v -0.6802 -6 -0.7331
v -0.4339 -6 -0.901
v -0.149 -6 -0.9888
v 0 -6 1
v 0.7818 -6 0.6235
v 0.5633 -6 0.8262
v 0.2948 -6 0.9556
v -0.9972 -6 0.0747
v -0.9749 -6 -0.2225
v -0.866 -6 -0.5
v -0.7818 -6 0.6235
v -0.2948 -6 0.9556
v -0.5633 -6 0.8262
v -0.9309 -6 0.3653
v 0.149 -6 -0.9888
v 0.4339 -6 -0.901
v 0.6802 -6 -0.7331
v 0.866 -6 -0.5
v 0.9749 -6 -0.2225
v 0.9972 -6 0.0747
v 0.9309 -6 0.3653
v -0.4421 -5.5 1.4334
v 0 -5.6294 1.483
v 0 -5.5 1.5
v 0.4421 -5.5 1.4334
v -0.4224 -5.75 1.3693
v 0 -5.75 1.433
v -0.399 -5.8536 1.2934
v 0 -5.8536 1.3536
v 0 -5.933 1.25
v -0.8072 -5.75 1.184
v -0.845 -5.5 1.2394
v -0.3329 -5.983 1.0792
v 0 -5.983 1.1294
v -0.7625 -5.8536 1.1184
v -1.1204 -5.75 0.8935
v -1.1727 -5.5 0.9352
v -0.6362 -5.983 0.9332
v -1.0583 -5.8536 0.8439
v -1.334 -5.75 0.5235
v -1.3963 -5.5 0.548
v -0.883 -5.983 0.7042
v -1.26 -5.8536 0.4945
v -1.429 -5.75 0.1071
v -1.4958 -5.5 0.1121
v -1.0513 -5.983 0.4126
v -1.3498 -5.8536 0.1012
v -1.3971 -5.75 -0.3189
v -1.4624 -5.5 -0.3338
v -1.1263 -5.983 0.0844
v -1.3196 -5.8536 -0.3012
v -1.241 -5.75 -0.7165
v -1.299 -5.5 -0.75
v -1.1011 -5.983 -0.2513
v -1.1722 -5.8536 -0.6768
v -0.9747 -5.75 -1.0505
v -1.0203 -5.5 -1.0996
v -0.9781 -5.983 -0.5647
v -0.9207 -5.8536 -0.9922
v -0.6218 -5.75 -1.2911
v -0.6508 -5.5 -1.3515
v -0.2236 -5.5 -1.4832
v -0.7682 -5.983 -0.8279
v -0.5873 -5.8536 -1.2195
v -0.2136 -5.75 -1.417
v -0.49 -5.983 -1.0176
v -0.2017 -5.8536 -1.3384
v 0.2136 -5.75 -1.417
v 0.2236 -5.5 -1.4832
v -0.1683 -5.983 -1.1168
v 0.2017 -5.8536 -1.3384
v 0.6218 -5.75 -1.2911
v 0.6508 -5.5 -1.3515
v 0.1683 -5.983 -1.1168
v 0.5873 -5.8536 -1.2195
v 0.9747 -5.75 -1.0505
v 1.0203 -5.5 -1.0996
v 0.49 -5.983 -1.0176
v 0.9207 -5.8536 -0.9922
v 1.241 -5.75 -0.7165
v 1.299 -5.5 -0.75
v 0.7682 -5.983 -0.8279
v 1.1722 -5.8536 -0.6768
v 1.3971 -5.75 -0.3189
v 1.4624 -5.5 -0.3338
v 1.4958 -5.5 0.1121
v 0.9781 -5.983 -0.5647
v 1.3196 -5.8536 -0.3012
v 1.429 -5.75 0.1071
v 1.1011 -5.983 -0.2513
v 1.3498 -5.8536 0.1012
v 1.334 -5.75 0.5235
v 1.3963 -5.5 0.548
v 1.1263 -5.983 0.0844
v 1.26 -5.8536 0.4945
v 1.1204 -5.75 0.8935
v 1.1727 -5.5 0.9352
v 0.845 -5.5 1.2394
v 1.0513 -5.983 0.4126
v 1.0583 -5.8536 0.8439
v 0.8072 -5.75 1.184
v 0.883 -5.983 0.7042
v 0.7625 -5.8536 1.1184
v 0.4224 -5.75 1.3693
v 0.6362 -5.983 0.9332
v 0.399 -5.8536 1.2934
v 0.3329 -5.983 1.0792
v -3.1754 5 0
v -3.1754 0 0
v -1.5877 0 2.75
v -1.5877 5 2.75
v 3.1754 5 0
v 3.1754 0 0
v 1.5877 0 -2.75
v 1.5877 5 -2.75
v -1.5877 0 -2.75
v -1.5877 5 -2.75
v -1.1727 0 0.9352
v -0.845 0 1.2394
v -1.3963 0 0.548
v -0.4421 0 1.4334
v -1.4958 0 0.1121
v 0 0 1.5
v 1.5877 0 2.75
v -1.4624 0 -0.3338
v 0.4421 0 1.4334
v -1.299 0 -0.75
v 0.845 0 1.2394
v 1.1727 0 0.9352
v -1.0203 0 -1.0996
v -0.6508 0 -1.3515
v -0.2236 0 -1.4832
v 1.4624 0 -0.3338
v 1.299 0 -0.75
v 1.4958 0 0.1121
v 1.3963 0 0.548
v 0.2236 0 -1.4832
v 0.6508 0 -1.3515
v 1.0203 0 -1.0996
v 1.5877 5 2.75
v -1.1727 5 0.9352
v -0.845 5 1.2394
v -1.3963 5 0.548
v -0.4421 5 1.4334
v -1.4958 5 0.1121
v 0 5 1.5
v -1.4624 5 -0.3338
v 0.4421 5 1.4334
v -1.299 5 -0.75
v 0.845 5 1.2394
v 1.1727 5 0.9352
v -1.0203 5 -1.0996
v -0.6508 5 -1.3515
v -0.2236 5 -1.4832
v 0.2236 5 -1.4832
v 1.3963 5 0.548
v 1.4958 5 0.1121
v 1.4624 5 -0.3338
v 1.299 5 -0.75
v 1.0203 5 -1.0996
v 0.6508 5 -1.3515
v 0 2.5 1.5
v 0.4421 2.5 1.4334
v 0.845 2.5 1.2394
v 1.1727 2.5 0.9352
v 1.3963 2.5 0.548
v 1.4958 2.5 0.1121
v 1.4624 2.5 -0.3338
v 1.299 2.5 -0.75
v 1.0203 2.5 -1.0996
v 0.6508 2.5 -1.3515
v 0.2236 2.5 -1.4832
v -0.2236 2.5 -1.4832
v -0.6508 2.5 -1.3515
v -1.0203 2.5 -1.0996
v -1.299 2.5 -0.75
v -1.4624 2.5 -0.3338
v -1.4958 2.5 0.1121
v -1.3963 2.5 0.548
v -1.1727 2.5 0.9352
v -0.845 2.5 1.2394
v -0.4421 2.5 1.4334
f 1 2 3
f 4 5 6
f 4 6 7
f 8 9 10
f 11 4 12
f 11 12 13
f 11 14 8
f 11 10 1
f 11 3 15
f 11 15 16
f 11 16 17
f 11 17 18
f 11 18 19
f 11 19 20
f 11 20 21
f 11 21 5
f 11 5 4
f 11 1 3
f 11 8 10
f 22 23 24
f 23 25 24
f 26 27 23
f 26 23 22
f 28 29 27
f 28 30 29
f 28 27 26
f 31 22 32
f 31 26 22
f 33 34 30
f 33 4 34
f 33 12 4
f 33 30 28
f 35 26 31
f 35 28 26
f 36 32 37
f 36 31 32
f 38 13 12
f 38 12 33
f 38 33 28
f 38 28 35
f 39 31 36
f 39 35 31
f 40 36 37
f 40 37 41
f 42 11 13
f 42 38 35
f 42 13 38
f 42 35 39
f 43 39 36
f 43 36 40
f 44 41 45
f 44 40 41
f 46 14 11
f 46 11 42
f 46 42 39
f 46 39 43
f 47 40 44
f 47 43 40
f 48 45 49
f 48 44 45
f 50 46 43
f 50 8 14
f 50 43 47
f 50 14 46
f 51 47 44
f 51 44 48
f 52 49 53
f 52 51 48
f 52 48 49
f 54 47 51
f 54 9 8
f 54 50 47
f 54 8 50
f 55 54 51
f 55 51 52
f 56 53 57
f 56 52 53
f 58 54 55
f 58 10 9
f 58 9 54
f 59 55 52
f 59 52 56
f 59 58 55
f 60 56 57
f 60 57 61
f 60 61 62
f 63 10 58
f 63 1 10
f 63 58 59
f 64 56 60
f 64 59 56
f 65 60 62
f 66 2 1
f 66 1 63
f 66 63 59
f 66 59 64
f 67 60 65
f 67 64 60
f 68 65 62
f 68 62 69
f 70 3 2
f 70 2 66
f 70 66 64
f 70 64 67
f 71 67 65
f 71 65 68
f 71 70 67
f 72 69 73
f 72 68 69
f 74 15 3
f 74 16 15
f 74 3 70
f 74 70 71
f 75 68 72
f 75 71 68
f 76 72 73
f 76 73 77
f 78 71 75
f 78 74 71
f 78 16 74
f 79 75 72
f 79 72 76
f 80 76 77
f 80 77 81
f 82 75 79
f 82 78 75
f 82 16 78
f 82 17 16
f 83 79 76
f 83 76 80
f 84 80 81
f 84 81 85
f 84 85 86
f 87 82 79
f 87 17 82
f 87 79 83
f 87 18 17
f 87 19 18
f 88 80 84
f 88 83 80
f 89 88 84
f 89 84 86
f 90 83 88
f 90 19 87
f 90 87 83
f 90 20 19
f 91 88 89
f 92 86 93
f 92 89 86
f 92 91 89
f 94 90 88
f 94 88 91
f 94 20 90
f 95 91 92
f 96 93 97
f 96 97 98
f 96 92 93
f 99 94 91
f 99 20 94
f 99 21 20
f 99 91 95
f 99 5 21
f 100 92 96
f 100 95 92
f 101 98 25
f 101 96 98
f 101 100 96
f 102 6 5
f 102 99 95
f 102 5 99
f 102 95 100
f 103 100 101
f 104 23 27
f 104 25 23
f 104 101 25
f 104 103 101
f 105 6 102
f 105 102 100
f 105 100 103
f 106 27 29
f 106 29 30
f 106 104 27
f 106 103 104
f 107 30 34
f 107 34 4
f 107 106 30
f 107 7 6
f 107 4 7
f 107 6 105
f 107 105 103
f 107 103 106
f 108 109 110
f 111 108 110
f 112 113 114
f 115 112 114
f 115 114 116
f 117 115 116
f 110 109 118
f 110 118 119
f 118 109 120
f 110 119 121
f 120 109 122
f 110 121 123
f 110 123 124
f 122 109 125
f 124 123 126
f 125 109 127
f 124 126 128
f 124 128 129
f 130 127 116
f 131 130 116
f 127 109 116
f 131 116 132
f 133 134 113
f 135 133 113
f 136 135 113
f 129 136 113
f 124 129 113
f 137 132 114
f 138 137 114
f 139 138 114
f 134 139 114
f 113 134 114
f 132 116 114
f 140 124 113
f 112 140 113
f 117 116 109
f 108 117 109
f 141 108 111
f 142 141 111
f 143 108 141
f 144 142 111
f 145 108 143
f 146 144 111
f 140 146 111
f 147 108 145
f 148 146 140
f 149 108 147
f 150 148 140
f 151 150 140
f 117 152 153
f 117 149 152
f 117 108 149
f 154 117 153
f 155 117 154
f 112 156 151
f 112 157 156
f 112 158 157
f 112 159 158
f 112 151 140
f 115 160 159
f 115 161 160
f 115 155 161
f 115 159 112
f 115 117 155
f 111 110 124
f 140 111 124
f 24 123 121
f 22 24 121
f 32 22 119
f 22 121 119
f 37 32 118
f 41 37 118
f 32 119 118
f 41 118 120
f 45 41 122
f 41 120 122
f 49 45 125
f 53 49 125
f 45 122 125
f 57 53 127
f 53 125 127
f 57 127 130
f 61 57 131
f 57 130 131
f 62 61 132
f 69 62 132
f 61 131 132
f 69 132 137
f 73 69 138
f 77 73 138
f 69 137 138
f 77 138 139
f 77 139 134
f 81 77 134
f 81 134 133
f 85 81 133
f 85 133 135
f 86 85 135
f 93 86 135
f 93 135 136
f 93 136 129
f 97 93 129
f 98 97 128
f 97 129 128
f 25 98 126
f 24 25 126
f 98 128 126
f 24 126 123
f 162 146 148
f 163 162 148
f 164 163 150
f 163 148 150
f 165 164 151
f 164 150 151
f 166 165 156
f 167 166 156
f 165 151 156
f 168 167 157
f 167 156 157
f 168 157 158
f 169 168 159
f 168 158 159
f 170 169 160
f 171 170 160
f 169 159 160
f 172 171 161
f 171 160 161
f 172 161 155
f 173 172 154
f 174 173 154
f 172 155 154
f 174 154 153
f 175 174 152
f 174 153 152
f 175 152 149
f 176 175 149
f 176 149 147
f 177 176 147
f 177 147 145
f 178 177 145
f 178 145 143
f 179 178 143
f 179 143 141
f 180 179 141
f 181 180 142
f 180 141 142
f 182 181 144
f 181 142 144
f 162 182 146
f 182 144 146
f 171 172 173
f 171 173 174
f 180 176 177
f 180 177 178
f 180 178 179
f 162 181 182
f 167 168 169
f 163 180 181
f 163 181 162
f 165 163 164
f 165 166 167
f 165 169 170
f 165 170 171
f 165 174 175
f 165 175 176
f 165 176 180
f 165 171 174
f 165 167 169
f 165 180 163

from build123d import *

# Parameters (mm, degrees)
BOSS_EXTRUDE1_DEPTH = 5
SKETCH2_R           = 1.5
BOSS_EXTRUDE2_DEPTH = 6
FILLET1_R           = 0.5
SKETCH3_R           = 1.5
CUT_EXTRUDE1_DEPTH  = 2.5


with BuildPart() as part:
    # Sketch1 → Boss-Extrude1 (new body)
    with BuildSketch(Plane(origin=(0, 0, 0), x_dir=(1, 0, 0), z_dir=(0, 1, 0))):
        Polygon((3.175426481, 0), (1.58771324, 2.75), (-1.58771324, 2.75), (-3.175426481, 0), (-1.58771324, -2.75), (1.58771324, -2.75), align=None)
    extrude(amount=BOSS_EXTRUDE1_DEPTH)

    # Sketch2 → Boss-Extrude2 (add)
    with BuildSketch(Plane.XZ):
        with Locations(Location((0, 0, 0), (0, 0, 90))):
            Circle(SKETCH2_R)
    extrude(amount=BOSS_EXTRUDE2_DEPTH)

    # Fillet1
    fillet1_edges = [part.edges().sort_by_distance(p)[0] for p in [
        (0, -6, -1.5),
    ]]
    fillet(fillet1_edges, radius=FILLET1_R)

    # Sketch3 → Cut-Extrude1 (cut)
    with BuildSketch(Plane(origin=(0, 5, 0), x_dir=(1, 0, 0), z_dir=(0, 1, 0))):
        with Locations(Location((0, 0, 0), (0, 0, 270))):
            Circle(SKETCH3_R)
    extrude(amount=-CUT_EXTRUDE1_DEPTH, mode=Mode.SUBTRACT)


solid = part.part
